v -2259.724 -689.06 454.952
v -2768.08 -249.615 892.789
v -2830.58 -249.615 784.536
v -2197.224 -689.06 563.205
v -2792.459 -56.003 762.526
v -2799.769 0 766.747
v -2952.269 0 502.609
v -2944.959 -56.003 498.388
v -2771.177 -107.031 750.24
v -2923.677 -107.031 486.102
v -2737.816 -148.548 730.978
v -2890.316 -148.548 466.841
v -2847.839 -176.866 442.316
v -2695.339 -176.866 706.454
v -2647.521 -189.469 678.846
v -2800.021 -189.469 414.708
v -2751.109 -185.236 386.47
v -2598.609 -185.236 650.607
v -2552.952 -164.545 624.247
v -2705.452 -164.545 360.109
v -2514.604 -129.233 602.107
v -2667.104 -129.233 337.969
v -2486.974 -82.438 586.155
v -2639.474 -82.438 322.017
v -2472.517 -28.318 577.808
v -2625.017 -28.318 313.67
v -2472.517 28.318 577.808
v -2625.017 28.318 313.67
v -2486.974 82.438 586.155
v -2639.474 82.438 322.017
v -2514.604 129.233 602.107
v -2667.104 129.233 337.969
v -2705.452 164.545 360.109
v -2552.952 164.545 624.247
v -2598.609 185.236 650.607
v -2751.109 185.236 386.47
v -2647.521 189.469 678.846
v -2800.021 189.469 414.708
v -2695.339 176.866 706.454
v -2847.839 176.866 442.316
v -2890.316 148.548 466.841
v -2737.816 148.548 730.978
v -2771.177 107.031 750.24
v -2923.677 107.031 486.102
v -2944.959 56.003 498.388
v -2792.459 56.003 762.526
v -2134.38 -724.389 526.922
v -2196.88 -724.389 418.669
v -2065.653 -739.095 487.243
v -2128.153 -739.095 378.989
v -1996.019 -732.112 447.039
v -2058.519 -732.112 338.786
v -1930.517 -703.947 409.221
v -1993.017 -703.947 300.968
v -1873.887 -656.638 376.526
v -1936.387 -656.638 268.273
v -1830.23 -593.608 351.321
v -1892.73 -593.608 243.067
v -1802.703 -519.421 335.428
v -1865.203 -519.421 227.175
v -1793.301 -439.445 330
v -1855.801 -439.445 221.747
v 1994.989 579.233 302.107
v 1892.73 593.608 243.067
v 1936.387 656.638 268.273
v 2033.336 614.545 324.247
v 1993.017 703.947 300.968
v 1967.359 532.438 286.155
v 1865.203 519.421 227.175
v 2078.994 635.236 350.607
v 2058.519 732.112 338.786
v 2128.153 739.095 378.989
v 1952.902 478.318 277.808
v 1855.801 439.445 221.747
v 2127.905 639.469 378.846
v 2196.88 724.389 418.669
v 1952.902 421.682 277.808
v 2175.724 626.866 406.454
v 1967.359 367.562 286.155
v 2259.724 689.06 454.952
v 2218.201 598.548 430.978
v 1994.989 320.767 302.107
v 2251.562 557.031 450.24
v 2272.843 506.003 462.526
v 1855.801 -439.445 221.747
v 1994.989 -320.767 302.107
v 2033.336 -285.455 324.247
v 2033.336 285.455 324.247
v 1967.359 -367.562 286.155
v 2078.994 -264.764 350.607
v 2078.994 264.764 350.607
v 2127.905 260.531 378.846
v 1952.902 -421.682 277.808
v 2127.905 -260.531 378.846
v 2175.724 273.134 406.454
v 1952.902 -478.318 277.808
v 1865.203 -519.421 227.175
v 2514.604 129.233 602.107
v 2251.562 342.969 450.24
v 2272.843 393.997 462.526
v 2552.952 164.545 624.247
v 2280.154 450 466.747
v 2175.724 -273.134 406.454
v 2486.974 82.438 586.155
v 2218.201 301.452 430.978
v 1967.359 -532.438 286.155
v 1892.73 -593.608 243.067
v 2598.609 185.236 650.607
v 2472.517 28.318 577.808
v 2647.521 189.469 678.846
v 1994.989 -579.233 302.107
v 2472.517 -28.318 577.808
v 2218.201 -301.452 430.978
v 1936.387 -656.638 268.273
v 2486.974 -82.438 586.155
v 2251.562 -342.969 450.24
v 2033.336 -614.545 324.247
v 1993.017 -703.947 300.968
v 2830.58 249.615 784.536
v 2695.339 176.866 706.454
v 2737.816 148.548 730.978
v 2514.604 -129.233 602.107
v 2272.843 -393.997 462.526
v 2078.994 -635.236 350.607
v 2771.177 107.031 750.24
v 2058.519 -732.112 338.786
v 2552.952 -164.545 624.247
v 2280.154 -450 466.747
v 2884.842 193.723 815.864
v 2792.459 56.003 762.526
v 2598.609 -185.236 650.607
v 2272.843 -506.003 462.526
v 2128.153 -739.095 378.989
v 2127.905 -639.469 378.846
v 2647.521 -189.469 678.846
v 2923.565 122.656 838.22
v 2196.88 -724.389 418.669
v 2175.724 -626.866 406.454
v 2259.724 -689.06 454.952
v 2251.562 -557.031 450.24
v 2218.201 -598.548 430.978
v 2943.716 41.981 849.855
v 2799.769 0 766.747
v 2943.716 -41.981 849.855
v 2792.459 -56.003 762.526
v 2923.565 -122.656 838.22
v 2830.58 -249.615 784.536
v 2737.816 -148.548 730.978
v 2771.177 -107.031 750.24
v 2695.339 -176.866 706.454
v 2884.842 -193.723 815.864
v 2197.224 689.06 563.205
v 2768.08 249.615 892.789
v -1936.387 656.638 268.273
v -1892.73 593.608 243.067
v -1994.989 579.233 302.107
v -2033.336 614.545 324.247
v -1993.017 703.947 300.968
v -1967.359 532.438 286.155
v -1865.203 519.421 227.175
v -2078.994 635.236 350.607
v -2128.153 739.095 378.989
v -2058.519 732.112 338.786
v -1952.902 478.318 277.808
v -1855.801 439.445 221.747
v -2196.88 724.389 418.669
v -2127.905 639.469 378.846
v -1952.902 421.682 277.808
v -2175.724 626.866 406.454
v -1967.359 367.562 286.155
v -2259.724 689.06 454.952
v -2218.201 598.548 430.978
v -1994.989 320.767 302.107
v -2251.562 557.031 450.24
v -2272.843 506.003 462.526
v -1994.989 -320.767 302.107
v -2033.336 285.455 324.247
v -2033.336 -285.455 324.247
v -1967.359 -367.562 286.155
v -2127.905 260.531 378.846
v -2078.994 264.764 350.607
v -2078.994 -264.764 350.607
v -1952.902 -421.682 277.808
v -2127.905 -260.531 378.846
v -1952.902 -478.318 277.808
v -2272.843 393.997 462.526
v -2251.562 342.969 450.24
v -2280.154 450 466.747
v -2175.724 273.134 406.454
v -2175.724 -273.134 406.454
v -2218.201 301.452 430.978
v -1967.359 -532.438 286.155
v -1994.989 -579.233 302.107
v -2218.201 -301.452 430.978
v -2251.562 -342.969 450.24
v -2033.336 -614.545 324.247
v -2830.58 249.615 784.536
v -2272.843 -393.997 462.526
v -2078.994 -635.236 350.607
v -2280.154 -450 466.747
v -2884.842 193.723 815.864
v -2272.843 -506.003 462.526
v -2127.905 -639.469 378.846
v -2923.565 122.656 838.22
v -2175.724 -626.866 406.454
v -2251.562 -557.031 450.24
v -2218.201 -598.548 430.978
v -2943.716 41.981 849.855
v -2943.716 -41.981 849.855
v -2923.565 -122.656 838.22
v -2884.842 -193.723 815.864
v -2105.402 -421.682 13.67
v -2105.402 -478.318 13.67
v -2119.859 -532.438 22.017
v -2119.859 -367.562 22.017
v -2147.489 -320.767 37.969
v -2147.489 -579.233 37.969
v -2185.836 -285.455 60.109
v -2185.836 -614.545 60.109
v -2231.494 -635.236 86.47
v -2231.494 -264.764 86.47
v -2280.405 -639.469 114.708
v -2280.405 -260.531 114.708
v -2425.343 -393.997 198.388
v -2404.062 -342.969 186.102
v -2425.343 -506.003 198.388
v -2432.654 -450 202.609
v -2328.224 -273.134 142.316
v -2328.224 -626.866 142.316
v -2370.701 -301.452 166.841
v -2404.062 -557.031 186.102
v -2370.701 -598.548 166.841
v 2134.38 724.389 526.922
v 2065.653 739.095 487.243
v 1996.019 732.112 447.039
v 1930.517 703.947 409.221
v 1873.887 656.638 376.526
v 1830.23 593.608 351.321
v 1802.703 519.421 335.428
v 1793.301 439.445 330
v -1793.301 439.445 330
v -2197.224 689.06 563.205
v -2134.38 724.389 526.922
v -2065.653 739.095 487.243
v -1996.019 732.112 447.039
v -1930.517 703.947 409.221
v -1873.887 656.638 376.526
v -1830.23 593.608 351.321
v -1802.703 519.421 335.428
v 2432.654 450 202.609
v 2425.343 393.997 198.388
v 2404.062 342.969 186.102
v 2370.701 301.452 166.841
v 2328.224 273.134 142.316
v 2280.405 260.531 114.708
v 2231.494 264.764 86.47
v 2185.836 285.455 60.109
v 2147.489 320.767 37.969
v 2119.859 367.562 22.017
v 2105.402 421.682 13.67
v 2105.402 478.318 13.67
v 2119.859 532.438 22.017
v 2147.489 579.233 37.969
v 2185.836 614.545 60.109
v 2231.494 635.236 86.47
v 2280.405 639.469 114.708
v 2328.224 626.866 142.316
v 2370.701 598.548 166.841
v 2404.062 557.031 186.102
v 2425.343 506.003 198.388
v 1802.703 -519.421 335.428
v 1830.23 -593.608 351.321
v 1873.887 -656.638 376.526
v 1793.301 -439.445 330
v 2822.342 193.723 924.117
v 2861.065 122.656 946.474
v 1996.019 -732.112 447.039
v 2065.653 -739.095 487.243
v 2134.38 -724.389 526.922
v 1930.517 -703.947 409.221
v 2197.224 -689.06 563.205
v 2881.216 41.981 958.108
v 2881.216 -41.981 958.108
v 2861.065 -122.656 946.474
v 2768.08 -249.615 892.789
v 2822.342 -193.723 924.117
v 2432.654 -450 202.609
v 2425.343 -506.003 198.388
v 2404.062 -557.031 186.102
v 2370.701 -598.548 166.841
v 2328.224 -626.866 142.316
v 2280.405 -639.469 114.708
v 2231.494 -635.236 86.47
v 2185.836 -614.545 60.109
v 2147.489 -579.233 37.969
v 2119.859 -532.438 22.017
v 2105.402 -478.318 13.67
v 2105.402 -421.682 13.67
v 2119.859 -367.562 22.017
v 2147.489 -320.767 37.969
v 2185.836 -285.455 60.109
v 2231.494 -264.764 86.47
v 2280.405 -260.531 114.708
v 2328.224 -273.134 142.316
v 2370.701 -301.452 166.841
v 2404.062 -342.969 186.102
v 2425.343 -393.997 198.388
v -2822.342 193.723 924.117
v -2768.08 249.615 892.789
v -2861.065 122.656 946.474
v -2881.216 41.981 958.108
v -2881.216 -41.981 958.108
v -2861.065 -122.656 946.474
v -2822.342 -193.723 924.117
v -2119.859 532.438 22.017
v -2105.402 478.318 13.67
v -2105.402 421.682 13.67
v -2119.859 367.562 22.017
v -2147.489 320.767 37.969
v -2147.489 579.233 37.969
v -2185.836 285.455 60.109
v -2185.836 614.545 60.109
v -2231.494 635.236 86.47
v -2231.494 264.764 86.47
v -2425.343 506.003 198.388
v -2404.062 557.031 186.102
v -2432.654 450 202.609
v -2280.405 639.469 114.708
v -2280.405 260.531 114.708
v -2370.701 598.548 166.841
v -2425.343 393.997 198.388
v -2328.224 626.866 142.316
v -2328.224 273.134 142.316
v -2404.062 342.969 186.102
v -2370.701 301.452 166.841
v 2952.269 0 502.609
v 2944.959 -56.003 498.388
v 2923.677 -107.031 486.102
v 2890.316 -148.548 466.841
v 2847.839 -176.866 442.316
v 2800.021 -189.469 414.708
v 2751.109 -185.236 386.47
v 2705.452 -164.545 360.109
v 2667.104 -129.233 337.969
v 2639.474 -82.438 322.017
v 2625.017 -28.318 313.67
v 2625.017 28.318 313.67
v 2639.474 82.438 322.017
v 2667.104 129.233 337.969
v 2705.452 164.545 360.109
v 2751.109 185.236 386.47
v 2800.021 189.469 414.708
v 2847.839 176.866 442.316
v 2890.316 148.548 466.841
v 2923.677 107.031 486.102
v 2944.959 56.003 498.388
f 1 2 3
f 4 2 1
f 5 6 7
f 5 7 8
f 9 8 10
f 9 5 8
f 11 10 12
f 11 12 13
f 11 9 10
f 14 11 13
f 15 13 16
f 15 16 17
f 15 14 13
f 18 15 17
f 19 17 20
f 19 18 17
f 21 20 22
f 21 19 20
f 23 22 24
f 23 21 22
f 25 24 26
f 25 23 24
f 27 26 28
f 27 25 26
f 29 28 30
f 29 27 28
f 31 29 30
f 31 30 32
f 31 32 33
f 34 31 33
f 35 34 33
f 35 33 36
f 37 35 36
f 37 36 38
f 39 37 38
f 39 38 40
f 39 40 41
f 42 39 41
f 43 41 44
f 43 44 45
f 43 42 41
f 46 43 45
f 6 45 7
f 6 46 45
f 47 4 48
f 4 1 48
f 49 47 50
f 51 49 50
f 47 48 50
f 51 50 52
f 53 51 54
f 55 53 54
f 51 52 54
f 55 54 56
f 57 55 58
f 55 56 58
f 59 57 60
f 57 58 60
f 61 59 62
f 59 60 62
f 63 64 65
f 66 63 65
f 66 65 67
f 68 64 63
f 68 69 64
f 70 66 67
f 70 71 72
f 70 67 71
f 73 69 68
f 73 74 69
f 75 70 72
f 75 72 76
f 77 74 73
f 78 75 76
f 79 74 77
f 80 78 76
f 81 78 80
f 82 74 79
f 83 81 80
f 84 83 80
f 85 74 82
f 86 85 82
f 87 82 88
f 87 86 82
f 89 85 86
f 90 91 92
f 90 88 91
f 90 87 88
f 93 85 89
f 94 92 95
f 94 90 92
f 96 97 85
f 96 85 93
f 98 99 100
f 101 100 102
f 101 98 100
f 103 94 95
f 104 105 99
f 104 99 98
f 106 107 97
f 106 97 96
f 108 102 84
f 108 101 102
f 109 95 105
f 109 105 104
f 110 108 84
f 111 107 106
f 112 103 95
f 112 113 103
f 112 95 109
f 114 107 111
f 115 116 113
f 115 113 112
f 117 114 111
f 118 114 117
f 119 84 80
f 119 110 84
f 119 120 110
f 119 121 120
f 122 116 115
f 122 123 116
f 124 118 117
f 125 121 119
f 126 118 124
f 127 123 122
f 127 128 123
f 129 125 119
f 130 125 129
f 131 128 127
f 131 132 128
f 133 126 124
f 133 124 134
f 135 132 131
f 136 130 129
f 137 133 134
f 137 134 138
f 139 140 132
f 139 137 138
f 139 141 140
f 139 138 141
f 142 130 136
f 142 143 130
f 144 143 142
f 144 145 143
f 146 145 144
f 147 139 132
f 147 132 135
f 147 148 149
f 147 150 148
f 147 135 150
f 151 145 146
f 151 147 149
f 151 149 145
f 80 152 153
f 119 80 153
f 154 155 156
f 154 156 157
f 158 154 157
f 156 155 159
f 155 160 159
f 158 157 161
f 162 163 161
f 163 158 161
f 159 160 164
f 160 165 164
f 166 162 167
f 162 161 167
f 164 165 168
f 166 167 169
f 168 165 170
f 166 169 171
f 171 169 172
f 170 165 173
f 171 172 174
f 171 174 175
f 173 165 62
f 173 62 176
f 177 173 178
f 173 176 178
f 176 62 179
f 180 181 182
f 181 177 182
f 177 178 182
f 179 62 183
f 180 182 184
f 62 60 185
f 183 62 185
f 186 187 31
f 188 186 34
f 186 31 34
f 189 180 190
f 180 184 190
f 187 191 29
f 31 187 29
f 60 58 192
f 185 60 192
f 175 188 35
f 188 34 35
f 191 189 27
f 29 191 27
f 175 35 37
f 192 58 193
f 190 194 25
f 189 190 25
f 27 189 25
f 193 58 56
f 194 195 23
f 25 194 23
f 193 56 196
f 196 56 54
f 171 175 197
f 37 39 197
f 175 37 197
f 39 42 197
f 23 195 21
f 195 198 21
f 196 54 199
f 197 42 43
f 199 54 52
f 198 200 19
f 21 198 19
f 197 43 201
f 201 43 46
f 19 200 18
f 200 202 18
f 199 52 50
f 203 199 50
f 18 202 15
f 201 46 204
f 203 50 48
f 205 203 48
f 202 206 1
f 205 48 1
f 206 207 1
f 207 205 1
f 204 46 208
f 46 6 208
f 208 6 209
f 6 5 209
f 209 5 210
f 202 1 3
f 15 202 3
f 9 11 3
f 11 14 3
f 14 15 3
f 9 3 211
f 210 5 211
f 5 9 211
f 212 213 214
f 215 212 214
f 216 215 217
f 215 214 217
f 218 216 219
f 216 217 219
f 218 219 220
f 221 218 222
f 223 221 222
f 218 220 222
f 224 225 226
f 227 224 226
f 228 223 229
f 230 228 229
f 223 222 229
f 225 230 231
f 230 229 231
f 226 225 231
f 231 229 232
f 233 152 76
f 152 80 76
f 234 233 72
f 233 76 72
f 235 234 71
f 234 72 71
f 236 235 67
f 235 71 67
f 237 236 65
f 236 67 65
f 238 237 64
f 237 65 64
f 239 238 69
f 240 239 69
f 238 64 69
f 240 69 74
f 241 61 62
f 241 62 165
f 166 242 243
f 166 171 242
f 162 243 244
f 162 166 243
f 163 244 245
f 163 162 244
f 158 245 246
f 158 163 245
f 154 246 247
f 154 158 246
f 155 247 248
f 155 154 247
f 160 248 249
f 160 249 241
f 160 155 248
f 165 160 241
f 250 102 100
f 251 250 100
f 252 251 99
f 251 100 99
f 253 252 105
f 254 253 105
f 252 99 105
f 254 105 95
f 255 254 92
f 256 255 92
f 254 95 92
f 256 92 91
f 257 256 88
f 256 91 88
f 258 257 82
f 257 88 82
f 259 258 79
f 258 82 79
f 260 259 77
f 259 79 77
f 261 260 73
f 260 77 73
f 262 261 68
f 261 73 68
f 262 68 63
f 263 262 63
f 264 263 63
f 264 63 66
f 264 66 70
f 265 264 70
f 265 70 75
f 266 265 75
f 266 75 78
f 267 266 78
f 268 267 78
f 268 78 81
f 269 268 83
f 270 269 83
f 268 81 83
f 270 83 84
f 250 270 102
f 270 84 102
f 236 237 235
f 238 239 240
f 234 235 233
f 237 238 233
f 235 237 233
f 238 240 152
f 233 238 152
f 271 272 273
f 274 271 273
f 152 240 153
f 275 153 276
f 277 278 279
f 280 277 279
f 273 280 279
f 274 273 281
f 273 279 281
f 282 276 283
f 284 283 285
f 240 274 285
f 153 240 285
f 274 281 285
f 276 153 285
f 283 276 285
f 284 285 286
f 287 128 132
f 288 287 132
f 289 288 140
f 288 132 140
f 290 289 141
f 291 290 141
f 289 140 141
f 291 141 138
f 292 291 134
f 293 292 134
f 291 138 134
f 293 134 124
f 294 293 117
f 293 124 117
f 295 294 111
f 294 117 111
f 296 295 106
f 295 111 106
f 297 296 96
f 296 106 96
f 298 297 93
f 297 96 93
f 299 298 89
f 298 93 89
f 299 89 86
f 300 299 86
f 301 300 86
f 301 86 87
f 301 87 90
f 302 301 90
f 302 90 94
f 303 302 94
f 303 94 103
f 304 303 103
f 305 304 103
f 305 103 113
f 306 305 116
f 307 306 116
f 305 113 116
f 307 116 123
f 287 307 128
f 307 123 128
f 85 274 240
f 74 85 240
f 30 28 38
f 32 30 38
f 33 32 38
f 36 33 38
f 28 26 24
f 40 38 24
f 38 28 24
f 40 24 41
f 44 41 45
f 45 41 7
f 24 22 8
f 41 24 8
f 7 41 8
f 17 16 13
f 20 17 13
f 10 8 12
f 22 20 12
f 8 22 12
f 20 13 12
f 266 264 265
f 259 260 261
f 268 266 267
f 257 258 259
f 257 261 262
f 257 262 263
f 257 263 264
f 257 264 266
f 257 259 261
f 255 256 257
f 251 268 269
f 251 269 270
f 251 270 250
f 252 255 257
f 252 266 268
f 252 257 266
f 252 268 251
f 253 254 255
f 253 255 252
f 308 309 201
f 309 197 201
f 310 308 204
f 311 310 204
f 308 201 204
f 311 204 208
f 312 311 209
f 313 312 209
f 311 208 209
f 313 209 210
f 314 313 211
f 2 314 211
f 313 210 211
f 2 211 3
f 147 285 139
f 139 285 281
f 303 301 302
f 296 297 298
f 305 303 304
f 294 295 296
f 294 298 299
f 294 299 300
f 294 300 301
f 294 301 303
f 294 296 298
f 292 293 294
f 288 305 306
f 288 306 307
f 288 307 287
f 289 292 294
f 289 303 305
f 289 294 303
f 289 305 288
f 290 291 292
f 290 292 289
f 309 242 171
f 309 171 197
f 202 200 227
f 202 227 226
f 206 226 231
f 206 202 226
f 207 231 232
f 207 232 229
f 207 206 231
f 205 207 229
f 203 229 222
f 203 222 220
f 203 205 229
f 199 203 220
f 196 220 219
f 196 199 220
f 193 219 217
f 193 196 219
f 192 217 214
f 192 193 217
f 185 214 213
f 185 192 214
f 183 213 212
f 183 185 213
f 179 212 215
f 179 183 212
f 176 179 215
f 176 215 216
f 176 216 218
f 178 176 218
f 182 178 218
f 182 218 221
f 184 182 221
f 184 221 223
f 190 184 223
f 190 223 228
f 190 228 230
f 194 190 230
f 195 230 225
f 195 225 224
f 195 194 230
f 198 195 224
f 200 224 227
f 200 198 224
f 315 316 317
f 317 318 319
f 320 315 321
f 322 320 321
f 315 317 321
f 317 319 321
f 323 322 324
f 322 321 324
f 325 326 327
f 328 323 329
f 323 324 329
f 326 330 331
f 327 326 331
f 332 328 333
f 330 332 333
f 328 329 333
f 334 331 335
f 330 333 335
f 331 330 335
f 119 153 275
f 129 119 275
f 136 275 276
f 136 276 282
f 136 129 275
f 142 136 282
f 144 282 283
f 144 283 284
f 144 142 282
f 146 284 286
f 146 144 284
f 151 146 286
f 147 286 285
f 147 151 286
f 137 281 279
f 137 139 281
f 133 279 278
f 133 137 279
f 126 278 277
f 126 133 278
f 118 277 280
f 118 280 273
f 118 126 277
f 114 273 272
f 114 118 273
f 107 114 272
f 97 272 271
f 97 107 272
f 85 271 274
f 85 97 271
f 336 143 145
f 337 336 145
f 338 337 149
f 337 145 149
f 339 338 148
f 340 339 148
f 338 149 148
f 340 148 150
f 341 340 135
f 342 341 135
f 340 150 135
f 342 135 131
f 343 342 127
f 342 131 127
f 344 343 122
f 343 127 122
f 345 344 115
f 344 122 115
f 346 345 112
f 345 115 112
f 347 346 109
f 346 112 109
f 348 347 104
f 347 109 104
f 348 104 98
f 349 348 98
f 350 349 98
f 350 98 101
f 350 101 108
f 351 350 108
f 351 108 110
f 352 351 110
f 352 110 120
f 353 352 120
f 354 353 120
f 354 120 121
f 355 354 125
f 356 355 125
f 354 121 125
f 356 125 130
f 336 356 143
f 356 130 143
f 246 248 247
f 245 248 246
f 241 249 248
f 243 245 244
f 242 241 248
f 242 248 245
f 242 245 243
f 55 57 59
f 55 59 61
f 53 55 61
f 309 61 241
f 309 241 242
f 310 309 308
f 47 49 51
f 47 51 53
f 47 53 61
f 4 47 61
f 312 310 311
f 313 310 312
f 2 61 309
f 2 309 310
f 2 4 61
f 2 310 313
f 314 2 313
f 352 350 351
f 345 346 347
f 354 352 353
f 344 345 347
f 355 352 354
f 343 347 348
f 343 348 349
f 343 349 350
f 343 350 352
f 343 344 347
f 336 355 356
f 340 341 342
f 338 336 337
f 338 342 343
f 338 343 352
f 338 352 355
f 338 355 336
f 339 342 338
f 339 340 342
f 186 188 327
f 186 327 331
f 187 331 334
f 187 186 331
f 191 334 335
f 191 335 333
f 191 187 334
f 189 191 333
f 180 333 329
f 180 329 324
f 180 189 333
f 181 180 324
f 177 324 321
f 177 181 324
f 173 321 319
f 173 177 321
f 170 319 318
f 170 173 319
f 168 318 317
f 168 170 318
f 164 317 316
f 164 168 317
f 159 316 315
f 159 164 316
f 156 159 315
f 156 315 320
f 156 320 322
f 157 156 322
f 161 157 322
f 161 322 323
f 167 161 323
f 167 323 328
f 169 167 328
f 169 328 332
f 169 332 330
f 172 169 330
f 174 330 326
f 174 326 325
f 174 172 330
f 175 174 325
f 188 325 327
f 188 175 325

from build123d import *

# Parameters (mm, degrees)
F4_DEPTH = 125
F5_R     = 300
F6_R     = 190
F7_DEPTH = 305


with BuildPart() as f4:
    # F3 (on face) → F4 (new body)
    with BuildSketch(Plane(origin=(305.4311259229, 0, -529.0222283114), x_dir=(0.8660254038, 0, 0.5), z_dir=(0.5, 0, -0.8660254038))):
        Polygon((1718.0444566228, -1000), (3218.0444566228, 0), (1718.0444566228, 1000), align=None)
    extrude(amount=F4_DEPTH)

    # F5
    f5_edges = [f4.edges().sort_by_distance(p)[0] for p in [
        (3123.589376, 0, 1025.873412),
        (1824.55127, -1000, 275.873412),
        (1824.55127, 1000, 275.873412),
    ]]
    fillet(f5_edges, radius=F5_R)

    # F6 (on face) → F7 (join)
    with BuildSketch(Plane(origin=(367.9311259229, 0, -637.2754037844), x_dir=(0.8660254038, 0, 0.5), z_dir=(0.5, 0, -0.8660254038))):
        with Locations((2618.0444566228, 0)):
            Circle(F6_R)
        with Locations((2018.0444566228, -450)):
            Circle(F6_R)
        with Locations((2018.0444566228, 450)):
            Circle(F6_R)
    extrude(amount=F7_DEPTH)


with BuildPart() as f8_1:
    # F8: instance of F4
    add(f4.part.mirror(Plane.YZ))


solid = Compound([f4.part, f8_1.part])
